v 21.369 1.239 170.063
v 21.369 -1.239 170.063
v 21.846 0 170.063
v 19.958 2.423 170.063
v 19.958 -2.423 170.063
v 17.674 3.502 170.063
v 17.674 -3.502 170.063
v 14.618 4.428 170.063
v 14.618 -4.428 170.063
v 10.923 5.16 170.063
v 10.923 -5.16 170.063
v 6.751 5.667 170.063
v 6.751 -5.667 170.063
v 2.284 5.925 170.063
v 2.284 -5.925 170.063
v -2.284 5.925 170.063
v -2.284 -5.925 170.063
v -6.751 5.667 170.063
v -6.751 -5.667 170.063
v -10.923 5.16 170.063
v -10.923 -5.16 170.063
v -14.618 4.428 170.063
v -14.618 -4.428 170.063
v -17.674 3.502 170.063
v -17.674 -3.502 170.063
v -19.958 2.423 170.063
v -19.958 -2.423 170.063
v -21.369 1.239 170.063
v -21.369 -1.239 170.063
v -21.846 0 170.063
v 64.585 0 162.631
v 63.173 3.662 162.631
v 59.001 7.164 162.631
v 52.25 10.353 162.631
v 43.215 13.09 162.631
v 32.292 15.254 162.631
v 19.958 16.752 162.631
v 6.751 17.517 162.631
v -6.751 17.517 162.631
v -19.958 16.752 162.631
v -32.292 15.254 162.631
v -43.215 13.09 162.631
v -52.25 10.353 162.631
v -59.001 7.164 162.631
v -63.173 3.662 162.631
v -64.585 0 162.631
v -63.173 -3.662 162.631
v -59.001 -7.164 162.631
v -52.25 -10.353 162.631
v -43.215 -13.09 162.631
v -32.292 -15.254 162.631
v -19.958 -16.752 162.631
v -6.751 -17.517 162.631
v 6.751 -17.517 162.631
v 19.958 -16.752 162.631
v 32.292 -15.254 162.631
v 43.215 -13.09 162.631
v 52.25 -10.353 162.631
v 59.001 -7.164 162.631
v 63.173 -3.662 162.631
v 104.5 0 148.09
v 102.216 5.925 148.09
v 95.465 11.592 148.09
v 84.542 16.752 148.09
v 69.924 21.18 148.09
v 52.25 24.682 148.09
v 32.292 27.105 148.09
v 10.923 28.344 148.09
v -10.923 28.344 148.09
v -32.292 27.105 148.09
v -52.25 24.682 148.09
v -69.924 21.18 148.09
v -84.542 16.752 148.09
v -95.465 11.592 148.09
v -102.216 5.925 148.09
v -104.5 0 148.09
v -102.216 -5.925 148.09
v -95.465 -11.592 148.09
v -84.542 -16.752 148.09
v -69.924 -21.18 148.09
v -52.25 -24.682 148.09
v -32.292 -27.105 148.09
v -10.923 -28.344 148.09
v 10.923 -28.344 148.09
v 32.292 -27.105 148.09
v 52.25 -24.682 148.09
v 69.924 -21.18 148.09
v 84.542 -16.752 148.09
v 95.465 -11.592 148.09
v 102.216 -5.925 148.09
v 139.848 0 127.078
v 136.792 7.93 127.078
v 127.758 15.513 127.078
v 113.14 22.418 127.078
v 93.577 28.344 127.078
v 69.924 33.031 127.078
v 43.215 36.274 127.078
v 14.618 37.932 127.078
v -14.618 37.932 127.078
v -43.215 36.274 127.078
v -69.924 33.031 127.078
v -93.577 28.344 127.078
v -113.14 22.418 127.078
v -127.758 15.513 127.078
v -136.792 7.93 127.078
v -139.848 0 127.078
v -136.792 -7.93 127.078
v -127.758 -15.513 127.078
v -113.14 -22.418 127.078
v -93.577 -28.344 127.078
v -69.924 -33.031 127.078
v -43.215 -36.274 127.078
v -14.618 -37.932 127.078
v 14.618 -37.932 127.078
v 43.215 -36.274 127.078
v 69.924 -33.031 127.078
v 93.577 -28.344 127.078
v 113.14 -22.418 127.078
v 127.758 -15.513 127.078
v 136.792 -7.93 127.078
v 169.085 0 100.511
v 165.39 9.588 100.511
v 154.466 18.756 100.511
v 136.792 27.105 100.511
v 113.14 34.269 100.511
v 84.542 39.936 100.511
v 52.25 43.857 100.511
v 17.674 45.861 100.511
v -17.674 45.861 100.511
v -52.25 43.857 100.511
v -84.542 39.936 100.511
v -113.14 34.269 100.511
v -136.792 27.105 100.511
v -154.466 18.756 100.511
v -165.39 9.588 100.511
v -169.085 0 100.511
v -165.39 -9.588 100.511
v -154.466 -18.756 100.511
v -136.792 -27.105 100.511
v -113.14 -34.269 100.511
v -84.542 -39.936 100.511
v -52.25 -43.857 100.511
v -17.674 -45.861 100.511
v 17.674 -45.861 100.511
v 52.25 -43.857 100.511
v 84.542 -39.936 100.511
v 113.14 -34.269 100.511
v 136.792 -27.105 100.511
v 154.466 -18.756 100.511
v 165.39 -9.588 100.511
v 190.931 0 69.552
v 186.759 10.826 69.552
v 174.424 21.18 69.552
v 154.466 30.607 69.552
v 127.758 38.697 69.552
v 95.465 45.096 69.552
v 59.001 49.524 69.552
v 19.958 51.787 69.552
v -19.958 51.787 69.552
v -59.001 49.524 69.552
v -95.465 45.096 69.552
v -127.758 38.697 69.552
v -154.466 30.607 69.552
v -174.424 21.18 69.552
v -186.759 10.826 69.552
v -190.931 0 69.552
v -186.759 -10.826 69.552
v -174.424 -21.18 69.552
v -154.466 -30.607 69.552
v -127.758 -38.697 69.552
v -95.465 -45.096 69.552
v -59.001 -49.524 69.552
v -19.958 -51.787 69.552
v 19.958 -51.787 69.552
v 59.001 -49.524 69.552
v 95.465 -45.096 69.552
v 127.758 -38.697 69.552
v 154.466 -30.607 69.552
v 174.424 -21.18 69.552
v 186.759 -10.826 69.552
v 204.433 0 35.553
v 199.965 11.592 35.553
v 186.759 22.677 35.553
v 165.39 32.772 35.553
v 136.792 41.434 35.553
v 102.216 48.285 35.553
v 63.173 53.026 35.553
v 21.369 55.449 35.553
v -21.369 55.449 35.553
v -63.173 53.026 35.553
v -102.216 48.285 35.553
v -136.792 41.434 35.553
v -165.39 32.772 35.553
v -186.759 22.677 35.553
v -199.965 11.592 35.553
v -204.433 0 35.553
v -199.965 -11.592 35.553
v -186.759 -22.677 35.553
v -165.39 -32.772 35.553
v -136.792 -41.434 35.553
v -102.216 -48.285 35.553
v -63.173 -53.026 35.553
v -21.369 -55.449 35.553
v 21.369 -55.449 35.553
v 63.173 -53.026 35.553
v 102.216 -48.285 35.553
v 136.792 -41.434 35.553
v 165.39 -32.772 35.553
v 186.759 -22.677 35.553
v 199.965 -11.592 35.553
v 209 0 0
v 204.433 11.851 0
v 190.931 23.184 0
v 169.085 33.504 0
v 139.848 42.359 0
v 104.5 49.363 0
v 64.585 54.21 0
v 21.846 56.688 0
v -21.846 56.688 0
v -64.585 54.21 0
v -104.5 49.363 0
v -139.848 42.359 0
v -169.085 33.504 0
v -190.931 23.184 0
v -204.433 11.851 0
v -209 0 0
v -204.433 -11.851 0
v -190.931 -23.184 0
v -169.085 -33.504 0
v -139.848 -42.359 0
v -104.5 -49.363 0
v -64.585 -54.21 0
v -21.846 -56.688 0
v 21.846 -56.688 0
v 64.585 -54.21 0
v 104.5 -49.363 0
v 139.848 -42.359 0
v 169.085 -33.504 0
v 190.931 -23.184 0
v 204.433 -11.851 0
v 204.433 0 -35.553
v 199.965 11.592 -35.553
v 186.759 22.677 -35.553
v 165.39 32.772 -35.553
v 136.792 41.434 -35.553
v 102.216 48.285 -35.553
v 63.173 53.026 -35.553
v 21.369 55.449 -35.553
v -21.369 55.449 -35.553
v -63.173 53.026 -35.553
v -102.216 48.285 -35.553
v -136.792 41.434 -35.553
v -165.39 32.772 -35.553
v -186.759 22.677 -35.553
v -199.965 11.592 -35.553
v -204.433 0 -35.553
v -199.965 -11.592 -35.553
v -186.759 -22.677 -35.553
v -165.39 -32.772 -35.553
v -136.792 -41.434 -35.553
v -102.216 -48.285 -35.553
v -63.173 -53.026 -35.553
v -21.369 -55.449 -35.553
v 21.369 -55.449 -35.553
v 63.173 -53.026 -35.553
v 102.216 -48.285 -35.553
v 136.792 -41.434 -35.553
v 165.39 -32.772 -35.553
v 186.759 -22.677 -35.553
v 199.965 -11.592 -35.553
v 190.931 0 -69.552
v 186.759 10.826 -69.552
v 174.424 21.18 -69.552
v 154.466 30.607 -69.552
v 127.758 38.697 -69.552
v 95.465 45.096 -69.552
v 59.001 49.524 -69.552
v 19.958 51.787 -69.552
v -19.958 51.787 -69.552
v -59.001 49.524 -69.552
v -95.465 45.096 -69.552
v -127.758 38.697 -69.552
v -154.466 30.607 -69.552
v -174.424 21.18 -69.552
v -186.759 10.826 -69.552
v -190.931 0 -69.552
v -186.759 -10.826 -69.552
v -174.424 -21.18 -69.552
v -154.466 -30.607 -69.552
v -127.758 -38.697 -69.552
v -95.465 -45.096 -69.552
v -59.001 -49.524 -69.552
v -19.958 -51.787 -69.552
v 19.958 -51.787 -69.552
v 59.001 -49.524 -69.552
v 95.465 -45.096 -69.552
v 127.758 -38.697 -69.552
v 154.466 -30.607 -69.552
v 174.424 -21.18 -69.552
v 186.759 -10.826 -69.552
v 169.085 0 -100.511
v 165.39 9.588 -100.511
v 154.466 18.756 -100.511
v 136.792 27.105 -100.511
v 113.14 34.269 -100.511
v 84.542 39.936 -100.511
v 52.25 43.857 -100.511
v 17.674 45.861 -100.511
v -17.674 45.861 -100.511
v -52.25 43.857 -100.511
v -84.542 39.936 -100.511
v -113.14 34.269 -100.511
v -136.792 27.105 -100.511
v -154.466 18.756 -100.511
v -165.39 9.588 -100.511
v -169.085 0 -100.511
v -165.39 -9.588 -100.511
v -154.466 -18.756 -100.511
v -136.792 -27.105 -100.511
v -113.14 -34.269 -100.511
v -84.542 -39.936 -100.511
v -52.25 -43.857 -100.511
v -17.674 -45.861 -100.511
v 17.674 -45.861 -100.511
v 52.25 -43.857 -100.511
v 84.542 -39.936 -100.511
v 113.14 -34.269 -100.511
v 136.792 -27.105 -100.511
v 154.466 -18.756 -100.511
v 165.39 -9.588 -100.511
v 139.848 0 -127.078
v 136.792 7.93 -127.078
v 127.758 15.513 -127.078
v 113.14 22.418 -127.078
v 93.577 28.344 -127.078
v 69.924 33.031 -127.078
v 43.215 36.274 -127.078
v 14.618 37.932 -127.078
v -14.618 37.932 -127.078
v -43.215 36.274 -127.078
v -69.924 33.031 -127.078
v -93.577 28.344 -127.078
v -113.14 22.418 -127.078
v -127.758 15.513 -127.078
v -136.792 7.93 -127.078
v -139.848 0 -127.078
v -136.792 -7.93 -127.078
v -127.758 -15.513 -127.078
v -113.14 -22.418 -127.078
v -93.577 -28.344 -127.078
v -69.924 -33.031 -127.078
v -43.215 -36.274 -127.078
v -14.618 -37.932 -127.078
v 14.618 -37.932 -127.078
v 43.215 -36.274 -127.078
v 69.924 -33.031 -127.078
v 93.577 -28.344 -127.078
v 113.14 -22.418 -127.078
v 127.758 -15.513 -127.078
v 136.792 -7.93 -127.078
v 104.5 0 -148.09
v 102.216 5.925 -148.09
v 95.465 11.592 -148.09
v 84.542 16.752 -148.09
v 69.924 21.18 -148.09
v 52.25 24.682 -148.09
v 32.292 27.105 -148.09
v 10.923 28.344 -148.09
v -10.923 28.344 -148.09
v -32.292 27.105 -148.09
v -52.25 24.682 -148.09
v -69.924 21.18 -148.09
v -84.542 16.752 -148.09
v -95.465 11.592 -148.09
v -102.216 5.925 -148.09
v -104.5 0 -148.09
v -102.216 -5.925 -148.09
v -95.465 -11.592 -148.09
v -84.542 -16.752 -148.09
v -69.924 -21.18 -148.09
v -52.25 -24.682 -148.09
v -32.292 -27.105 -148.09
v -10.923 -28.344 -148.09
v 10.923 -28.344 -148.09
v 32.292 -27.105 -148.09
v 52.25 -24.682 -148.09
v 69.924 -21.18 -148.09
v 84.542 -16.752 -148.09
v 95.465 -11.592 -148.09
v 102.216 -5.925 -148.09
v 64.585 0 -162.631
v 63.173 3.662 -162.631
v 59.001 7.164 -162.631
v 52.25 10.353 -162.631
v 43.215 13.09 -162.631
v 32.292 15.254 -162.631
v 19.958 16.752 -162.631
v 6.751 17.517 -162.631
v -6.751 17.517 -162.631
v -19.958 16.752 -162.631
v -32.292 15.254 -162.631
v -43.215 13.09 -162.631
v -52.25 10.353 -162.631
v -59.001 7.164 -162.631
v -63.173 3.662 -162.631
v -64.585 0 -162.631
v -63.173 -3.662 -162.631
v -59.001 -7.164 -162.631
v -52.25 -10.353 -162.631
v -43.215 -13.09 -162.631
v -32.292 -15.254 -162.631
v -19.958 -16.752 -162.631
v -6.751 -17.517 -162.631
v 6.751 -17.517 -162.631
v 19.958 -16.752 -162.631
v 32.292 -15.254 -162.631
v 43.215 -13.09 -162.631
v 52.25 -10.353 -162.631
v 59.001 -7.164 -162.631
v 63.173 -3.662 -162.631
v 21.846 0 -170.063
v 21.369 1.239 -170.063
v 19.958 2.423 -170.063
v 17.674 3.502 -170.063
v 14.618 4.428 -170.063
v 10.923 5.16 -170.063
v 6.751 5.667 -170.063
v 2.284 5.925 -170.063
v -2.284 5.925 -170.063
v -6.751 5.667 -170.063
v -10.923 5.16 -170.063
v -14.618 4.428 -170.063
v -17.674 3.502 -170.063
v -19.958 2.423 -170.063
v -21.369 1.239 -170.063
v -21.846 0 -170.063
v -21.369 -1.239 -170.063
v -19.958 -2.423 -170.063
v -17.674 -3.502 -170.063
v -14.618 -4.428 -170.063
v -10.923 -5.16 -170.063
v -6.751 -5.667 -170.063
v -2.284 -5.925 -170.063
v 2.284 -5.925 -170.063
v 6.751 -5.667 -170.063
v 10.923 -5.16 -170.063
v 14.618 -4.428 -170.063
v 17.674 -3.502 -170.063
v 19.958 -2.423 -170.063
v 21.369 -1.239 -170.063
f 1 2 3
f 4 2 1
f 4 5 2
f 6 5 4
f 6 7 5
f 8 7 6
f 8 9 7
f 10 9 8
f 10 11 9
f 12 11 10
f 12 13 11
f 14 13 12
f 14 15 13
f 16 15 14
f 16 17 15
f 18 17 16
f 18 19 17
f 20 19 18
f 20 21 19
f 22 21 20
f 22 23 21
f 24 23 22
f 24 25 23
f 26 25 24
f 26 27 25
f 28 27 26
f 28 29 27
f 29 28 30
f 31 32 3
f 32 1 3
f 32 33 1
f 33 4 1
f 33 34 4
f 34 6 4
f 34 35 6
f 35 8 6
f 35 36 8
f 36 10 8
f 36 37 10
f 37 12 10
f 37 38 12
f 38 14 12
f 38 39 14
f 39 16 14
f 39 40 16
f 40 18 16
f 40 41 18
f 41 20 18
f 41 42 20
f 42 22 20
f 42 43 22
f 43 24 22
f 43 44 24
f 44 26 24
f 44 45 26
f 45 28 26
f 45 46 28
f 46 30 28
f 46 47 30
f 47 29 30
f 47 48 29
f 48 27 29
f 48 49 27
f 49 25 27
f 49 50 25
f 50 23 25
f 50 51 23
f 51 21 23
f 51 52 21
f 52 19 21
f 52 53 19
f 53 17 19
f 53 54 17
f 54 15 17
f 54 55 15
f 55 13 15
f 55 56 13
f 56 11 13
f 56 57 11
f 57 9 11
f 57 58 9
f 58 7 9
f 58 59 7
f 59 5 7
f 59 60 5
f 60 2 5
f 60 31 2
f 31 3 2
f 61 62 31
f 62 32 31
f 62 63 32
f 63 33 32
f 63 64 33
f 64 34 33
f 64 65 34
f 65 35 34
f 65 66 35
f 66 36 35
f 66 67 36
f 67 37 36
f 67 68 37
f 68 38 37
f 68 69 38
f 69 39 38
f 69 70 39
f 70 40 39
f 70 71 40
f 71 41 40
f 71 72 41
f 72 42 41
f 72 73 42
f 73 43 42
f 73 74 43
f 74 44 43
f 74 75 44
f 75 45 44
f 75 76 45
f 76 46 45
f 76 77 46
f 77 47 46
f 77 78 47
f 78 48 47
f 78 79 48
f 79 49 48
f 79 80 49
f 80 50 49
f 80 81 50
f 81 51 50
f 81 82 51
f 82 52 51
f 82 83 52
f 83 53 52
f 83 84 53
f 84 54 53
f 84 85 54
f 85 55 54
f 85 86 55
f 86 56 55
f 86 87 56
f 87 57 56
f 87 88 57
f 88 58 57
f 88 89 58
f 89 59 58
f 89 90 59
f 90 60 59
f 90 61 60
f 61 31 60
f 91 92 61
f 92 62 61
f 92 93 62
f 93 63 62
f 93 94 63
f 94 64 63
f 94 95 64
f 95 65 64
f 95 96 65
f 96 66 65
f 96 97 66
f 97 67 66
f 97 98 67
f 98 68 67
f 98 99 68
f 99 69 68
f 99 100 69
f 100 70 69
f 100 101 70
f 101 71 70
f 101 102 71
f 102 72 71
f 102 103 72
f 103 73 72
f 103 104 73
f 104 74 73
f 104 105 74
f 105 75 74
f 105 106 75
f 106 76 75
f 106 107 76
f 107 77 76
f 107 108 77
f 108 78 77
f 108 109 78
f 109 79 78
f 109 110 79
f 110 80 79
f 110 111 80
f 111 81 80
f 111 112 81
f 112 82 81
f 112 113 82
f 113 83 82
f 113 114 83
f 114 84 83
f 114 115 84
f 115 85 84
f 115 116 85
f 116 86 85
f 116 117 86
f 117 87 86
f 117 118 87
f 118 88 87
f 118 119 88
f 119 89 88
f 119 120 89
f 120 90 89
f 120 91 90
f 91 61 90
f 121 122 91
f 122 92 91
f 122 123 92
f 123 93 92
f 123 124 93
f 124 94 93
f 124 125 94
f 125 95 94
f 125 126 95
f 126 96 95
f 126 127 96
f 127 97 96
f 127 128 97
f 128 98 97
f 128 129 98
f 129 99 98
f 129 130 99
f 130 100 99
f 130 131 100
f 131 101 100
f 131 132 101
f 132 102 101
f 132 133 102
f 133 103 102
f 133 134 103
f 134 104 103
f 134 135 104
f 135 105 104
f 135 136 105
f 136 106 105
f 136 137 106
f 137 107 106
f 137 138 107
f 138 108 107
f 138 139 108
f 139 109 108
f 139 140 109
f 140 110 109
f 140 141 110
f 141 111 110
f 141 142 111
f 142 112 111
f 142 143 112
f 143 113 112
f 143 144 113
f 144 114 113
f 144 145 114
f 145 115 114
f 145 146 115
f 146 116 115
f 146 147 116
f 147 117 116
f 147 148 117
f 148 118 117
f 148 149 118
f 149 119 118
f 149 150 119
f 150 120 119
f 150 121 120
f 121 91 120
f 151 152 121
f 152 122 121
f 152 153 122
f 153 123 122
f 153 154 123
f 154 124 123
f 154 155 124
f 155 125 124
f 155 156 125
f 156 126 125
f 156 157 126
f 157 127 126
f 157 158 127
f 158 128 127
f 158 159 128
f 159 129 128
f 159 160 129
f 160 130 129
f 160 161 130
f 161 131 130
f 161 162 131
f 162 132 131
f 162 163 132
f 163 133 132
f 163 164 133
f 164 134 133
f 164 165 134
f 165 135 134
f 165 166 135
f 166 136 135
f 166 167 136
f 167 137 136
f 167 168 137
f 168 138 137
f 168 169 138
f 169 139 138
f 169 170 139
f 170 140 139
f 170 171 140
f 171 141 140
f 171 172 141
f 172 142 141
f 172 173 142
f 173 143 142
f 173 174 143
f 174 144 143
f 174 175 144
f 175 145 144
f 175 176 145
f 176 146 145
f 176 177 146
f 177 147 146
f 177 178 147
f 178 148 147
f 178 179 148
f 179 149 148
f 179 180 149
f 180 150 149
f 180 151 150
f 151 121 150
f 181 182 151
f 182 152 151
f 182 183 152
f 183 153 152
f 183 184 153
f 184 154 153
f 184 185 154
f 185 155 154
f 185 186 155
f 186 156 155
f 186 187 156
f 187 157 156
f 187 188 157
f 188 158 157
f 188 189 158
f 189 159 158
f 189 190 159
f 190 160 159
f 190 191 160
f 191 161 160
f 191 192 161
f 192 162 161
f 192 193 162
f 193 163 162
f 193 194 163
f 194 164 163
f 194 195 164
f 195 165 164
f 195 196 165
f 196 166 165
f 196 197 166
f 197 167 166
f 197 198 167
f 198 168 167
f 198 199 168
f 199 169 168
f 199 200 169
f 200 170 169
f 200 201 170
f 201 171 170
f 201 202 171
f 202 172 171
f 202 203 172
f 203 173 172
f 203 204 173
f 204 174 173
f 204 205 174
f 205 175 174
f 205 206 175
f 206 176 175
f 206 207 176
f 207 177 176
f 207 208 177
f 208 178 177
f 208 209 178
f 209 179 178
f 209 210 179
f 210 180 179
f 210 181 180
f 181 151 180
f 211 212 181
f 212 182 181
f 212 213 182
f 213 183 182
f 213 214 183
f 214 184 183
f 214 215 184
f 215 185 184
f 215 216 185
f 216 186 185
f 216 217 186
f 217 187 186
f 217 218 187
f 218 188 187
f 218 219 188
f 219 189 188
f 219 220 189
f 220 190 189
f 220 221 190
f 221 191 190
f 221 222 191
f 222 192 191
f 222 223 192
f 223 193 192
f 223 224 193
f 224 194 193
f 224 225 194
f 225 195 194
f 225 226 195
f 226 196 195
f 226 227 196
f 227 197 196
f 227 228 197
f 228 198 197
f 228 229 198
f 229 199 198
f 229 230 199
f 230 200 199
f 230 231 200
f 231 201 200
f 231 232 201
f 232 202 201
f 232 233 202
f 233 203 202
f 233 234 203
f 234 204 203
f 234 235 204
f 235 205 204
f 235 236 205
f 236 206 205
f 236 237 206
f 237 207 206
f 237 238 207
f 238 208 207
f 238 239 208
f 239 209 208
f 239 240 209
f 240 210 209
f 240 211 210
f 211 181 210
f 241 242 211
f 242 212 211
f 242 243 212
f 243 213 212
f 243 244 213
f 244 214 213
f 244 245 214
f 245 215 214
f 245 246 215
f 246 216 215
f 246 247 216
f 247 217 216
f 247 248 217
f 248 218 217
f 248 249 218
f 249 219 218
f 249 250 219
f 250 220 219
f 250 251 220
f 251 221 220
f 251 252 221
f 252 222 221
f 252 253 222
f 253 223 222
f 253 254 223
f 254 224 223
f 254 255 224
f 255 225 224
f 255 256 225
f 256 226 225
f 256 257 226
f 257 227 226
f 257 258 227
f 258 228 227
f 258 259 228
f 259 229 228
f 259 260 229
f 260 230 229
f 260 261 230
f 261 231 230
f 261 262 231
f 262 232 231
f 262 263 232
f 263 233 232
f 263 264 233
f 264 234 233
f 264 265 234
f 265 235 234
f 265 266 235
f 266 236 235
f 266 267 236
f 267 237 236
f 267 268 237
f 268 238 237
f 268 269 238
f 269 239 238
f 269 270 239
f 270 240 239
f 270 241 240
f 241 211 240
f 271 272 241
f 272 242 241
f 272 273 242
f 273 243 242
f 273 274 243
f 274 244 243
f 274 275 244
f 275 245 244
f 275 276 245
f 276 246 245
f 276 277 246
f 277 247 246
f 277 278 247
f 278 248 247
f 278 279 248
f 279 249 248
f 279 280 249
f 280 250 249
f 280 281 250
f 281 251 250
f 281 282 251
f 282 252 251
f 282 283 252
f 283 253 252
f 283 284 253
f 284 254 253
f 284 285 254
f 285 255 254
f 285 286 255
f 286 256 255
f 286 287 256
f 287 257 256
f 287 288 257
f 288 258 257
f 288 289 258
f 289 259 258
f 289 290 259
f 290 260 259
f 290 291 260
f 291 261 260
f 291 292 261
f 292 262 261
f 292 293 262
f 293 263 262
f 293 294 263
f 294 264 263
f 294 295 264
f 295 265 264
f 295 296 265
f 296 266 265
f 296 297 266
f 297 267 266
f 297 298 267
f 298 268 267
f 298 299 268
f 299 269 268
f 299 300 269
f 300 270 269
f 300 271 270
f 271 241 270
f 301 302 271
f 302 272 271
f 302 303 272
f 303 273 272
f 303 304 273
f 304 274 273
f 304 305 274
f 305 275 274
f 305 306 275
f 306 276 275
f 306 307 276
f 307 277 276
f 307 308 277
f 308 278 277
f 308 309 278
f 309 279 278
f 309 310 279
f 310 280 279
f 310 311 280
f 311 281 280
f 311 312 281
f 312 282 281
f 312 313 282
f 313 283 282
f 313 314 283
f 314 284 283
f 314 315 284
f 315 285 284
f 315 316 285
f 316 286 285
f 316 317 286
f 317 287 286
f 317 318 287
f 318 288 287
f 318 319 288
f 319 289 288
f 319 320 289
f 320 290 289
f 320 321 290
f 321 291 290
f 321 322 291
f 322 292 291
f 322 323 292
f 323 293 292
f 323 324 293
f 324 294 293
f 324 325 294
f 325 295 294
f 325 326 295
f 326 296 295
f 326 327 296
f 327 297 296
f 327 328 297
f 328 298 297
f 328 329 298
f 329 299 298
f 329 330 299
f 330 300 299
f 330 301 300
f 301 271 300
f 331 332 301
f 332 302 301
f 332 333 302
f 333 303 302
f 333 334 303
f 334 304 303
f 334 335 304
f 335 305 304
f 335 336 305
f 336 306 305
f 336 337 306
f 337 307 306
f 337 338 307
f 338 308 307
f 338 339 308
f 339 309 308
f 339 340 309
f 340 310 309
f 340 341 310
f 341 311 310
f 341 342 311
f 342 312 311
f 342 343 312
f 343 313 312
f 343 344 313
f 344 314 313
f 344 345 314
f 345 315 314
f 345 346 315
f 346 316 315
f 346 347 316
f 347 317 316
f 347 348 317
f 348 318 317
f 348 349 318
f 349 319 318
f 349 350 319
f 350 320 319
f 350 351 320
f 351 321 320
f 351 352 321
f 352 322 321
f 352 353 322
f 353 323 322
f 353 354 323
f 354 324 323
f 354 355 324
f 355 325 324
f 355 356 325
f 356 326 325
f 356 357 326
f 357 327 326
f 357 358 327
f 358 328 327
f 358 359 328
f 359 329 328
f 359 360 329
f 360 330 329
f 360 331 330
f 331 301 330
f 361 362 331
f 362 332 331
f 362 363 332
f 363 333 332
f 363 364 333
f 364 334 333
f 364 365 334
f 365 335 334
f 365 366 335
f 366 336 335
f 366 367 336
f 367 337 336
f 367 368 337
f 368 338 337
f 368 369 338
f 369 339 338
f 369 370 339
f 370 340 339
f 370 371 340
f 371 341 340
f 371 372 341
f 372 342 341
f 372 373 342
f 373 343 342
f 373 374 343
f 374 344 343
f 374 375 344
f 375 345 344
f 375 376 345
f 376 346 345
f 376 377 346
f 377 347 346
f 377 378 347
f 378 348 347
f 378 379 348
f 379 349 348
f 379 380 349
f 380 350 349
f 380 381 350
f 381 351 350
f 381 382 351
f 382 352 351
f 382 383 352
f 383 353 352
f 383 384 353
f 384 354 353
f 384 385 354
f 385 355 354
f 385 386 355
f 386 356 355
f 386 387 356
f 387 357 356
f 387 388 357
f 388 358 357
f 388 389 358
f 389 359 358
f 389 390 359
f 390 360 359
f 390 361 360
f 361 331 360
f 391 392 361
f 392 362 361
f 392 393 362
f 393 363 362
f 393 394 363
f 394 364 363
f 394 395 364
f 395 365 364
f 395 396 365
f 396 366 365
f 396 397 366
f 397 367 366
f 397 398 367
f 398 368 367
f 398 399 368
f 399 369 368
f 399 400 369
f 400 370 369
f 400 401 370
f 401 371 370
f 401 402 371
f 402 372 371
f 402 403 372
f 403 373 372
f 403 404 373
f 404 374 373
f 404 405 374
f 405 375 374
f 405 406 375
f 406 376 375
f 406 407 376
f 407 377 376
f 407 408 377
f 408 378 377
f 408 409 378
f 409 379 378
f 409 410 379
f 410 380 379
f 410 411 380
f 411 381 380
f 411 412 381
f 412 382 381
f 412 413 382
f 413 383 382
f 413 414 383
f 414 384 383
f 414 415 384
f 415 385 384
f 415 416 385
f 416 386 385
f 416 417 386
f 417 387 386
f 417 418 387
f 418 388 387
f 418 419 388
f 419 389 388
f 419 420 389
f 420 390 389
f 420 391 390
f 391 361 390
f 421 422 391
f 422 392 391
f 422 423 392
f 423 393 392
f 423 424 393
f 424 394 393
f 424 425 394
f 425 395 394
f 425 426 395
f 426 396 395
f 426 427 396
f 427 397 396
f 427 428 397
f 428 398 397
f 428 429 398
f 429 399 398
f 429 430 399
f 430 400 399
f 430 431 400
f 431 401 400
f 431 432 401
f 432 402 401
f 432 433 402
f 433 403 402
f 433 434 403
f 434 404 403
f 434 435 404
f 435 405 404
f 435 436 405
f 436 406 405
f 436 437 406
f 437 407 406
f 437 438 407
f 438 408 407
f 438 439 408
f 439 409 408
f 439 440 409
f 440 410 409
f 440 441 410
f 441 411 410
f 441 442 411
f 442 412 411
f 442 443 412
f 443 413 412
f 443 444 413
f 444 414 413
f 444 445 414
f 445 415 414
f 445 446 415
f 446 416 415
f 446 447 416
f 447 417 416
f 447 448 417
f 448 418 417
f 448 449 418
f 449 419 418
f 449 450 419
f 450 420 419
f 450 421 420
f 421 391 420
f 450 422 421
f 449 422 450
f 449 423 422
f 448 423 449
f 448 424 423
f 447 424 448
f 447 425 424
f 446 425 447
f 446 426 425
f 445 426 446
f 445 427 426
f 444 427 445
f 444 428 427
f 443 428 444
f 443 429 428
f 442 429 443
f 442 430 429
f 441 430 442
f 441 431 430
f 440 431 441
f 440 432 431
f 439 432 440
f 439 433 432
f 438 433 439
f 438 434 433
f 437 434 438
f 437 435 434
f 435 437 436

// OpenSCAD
// Generated by SolidPython 1.0.1 on 2020-07-29 00:46:49


scale(v = [11, 3, 9]) {
	sphere(r = 19);
}
/***********************************************
*********      SolidPython code:      **********
************************************************
 
# import packages: SolidPython
from solid import *
from solid.utils import *
from itertools import chain, combinations, permutations


class Resize:

    def __init__(self, scad_file):
        self.scad_file = scad_file
        #self.scad_file = import_scad(scad_file)
        # cone/cylinder param:
        self.r1 = 0
        self.r2 = 0
        self.h = 0
        # rectangular prism param:
        self.w = 0
        self.l = 0
        # ellipse param:
        self.r = 0

    # import OpenScad code (file name corresponds to shape)


    # classify shape + parameters
    def assign(self, param1, param2, param3):
        if self.scad_file == 'cone.scad':
            self.r1 = param1
            self.r2 = param2
            self.h = param3
        elif self.scad_file == 'cylinder.scad':
            self.r1 = param1
            self.r2 = param2
            self.h = param3
        elif self.scad_file == 'rectangularPrism.scad':
            self.h = param1
            self.l = param2
            self.w = param3
        else:
            self.r = param1
            self.h = param2

    # resize parameters
    def iterate(self):
        x = range(3, 20, 2)
        i = 1
        if self.scad_file == 'cone.scad':
            tempList = list(permutations(x, 2))
            for temp in tempList:
                param1 = temp[0]
                param2 = temp[1]
                filepath = 'produced_scad_files/' + 'cone' + str(param1) + '_' + str(param2) + '_' + '.scad'
                scad_render_to_file(cylinder(h=param1, r1=param2, r2=0), filepath)

        elif self.scad_file == 'cylinder.scad':
            tempList = list(permutations(x, 3))
            for temp in tempList:
                param1 = temp[0]
                param2 = temp[1]
                filepath = 'produced_scad_files/' + 'cylinder' + str(param1) + '_' + str(param2) + '_' + '.scad'
                scad_render_to_file(cylinder(h=param1, r1=param2, r2=param2), filepath)

        elif self.scad_file == 'rectangularPrism.scad':
            tempList = list(permutations(x, 3))
            for temp in tempList:
                param1 = temp[0]
                param2 = temp[1]
                param3 = temp[2]
                filepath = 'produced_scad_files/' + 'rectangularPrism' + str(param1) + '_' + str(param2) + '_' + str(
                    param3) + '.scad'
                scad_render_to_file(cube(size=(param1, param2, param3)), filepath)

        elif self.scad_file == 'ellipse.scad':
            tempList = list(permutations(x, 4))
            for temp in tempList:
                param1 = temp[0]
                param2 = temp[1]
                param3 = temp[2]
                param4 = temp[3]
                filepath = 'produced_scad_files/' + 'ellipse' + str(param1) + '_' + str(param2) + '_' + str(param3) + '_' + str(param4) + '.scad'
                scad_render_to_file(scale([param1, param2, param3])(sphere(r=param4)), filepath)

    def render_to_scadfile(self):
        scad_render_to_file(scad, 'example.scad') 
 
************************************************/
